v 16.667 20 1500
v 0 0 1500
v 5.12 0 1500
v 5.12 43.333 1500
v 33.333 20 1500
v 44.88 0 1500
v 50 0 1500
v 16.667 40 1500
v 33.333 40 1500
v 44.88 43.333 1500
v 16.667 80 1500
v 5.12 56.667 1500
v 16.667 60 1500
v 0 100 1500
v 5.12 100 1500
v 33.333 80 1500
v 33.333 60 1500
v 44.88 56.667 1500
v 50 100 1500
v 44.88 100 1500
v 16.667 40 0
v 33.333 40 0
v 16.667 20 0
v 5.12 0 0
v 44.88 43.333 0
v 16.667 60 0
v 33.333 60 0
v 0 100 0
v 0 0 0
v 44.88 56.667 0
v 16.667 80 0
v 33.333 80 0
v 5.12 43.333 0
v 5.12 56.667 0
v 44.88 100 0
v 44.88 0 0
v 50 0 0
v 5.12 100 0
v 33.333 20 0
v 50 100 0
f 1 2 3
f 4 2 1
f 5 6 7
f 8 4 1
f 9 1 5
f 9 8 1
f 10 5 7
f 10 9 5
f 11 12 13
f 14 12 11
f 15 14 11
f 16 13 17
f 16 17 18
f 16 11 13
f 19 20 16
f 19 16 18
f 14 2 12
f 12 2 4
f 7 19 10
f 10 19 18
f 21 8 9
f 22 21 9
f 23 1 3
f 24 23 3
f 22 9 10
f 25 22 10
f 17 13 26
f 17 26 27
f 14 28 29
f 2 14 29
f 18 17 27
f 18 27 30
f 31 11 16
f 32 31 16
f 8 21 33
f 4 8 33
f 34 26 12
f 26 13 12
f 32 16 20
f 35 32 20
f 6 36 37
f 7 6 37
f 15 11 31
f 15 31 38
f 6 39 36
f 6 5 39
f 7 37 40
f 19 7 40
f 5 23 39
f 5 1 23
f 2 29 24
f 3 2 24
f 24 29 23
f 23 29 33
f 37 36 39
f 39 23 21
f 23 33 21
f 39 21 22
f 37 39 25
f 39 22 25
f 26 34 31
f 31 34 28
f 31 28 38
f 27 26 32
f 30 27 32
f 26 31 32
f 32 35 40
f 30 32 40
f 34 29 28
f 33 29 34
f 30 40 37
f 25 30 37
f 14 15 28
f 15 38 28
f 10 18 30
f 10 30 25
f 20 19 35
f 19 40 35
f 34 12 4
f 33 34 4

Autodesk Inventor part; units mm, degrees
ref_plane "YZ Plane" through (0, 0, 0) normal (1, 0, 0) x (0, 1, 0)
ref_plane "XZ Plane" through (0, 0, 0) normal (0, 1, 0) x (-1, 0, 0)
ref_plane "XY Plane" through (0, 0, 0) normal (0, 0, 1) x (1, 0, 0)
sketch "Sketch1" plane through (0, 0, 0) normal (0, 0, 1) x (1, 0, 0)
  line L0 (0, 0) -> (50, 0)
  line L1 (50, 0) -> (50, 100)
  line L2 (50, 100) -> (0, 100)
  line L3 (0, 100) -> (0, 0)
  dimension "d0" = 50
  dimension "d1" = 100
extrude "Extrusion1" add sketch "Sketch1" along normal blind 1500
sketch "Sketch2" plane through (0, 0, 1500) normal (0, 0, 1) x (1, 0, 0)
  line L0 (0, 0) -> (50, 0) projected
  line L1 (50, 0) -> (50, 100) projected
  line L2 (50, 100) -> (0, 100) projected
  line L3 (0, 100) -> (0, 0) projected
  line L4 (16.6667, 80) -> (33.3333, 80)
  line L5 (16.6667, 80) -> (43.3333, 80) construction
  line L6 (16.6667, 80) -> (5.1197, 100)
  line L7 (50, 100) -> (0, 100) projected
  line L8 (16.6667, 80) -> (39.7607, 80) construction
  line L9 (33.3333, 80) -> (44.8803, 100)
  line L10 (33.3333, 80) -> (56.4273, 80) construction
  line L11 (44.8803, 100) -> (5.1197, 100)
  line L12 (0, 50) -> (50, 50)
  line L13 (50, 0) -> (50, 100) projected
  line L14 (16.6667, 20) -> (33.3333, 20)
  line L15 (16.6667, 20) -> (5.1197, 0)
  line L16 (33.3333, 20) -> (44.8803, 0)
  line L17 (44.8803, 0) -> (5.1197, 0)
  dimension "d4" = 50
  dimension "d5" = 16.6667
  dimension "d6" = 100
  dimension "d7" = 20
  dimension "d8" = 16.6667
  dimension "d11" = 120
  dimension "d12" = 60
  dimension "d13" = 50
extrude "Extrusion2" cut sketch "Sketch2" against normal up to next contours L15 L14 L16 L0 | L2 L9 L4 L6
sketch "Sketch3" plane through (0, 0, 1500) normal (0, 0, 1) x (1, 0, 0)
  line L0 (33.3333, 80) -> (16.6667, 80) projected
  line L1 (16.6667, 60) -> (33.3333, 60)
  line L2 (0, 100) -> (0, 0) projected
  line L3 (16.6667, 20) -> (33.3333, 20) projected
  line L4 (50, 100) -> (44.8803, 100) projected
  line L5 (16.6667, 40) -> (33.3333, 40)
  line L6 (5.1197, 56.6667) -> (5.1197, 43.3333)
  line L7 (25, 80) -> (25, 20)
  line L8 (16.6667, 60) -> (5.1197, 56.6667)
  line L9 (16.6667, 40) -> (5.1197, 43.3333)
  line L10 (44.8803, 56.6667) -> (44.8803, 43.3333)
  line L11 (33.3333, 60) -> (44.8803, 56.6667)
  line L12 (33.3333, 40) -> (44.8803, 43.3333)
  dimension "d16" = 16.6667
  dimension "d17" = 16.6667
  dimension "d18" = 16.6667
  dimension "d19" = 16.6667
  dimension "d20" = 20
  dimension "d21" = 20
  dimension "d22" = 100
  dimension "d23" = 16.6667
  dimension "d25" = 40
  dimension "d26" = 16.6667
  dimension "d27" = 13.3333
  dimension "d28" = 3.3333
extrude "Extrusion3" cut sketch "Sketch3" against normal blind 2900
equation "\"d1\" = 2 * d0"
equation "\"d5\" = 0.333333 * d4"
equation "\"d7\" = 0.2 * d6"
equation "\"d8\" = -0.5 * d5 + 0.5 * d4"
equation "\"d13\" = 0.5 * d6"
equation "\"d17\" = d16"
equation "\"d19\" = d18"
equation "\"d21\" = 0.5 * d22 - 1.5 * d20"
equation "\"d23\" = d24"
equation "\"d25\" = -0.5 * d20 + 0.5 * d22"
equation "\"d26\" = d16"
equation "\"d27\" = 0.666667 * d21"
equation "\"d28\" = -0.5 * d27 + 0.5 * d21"
equation "\"d24\" = 16.666667"
properties part number "wheelRoadGantry"
